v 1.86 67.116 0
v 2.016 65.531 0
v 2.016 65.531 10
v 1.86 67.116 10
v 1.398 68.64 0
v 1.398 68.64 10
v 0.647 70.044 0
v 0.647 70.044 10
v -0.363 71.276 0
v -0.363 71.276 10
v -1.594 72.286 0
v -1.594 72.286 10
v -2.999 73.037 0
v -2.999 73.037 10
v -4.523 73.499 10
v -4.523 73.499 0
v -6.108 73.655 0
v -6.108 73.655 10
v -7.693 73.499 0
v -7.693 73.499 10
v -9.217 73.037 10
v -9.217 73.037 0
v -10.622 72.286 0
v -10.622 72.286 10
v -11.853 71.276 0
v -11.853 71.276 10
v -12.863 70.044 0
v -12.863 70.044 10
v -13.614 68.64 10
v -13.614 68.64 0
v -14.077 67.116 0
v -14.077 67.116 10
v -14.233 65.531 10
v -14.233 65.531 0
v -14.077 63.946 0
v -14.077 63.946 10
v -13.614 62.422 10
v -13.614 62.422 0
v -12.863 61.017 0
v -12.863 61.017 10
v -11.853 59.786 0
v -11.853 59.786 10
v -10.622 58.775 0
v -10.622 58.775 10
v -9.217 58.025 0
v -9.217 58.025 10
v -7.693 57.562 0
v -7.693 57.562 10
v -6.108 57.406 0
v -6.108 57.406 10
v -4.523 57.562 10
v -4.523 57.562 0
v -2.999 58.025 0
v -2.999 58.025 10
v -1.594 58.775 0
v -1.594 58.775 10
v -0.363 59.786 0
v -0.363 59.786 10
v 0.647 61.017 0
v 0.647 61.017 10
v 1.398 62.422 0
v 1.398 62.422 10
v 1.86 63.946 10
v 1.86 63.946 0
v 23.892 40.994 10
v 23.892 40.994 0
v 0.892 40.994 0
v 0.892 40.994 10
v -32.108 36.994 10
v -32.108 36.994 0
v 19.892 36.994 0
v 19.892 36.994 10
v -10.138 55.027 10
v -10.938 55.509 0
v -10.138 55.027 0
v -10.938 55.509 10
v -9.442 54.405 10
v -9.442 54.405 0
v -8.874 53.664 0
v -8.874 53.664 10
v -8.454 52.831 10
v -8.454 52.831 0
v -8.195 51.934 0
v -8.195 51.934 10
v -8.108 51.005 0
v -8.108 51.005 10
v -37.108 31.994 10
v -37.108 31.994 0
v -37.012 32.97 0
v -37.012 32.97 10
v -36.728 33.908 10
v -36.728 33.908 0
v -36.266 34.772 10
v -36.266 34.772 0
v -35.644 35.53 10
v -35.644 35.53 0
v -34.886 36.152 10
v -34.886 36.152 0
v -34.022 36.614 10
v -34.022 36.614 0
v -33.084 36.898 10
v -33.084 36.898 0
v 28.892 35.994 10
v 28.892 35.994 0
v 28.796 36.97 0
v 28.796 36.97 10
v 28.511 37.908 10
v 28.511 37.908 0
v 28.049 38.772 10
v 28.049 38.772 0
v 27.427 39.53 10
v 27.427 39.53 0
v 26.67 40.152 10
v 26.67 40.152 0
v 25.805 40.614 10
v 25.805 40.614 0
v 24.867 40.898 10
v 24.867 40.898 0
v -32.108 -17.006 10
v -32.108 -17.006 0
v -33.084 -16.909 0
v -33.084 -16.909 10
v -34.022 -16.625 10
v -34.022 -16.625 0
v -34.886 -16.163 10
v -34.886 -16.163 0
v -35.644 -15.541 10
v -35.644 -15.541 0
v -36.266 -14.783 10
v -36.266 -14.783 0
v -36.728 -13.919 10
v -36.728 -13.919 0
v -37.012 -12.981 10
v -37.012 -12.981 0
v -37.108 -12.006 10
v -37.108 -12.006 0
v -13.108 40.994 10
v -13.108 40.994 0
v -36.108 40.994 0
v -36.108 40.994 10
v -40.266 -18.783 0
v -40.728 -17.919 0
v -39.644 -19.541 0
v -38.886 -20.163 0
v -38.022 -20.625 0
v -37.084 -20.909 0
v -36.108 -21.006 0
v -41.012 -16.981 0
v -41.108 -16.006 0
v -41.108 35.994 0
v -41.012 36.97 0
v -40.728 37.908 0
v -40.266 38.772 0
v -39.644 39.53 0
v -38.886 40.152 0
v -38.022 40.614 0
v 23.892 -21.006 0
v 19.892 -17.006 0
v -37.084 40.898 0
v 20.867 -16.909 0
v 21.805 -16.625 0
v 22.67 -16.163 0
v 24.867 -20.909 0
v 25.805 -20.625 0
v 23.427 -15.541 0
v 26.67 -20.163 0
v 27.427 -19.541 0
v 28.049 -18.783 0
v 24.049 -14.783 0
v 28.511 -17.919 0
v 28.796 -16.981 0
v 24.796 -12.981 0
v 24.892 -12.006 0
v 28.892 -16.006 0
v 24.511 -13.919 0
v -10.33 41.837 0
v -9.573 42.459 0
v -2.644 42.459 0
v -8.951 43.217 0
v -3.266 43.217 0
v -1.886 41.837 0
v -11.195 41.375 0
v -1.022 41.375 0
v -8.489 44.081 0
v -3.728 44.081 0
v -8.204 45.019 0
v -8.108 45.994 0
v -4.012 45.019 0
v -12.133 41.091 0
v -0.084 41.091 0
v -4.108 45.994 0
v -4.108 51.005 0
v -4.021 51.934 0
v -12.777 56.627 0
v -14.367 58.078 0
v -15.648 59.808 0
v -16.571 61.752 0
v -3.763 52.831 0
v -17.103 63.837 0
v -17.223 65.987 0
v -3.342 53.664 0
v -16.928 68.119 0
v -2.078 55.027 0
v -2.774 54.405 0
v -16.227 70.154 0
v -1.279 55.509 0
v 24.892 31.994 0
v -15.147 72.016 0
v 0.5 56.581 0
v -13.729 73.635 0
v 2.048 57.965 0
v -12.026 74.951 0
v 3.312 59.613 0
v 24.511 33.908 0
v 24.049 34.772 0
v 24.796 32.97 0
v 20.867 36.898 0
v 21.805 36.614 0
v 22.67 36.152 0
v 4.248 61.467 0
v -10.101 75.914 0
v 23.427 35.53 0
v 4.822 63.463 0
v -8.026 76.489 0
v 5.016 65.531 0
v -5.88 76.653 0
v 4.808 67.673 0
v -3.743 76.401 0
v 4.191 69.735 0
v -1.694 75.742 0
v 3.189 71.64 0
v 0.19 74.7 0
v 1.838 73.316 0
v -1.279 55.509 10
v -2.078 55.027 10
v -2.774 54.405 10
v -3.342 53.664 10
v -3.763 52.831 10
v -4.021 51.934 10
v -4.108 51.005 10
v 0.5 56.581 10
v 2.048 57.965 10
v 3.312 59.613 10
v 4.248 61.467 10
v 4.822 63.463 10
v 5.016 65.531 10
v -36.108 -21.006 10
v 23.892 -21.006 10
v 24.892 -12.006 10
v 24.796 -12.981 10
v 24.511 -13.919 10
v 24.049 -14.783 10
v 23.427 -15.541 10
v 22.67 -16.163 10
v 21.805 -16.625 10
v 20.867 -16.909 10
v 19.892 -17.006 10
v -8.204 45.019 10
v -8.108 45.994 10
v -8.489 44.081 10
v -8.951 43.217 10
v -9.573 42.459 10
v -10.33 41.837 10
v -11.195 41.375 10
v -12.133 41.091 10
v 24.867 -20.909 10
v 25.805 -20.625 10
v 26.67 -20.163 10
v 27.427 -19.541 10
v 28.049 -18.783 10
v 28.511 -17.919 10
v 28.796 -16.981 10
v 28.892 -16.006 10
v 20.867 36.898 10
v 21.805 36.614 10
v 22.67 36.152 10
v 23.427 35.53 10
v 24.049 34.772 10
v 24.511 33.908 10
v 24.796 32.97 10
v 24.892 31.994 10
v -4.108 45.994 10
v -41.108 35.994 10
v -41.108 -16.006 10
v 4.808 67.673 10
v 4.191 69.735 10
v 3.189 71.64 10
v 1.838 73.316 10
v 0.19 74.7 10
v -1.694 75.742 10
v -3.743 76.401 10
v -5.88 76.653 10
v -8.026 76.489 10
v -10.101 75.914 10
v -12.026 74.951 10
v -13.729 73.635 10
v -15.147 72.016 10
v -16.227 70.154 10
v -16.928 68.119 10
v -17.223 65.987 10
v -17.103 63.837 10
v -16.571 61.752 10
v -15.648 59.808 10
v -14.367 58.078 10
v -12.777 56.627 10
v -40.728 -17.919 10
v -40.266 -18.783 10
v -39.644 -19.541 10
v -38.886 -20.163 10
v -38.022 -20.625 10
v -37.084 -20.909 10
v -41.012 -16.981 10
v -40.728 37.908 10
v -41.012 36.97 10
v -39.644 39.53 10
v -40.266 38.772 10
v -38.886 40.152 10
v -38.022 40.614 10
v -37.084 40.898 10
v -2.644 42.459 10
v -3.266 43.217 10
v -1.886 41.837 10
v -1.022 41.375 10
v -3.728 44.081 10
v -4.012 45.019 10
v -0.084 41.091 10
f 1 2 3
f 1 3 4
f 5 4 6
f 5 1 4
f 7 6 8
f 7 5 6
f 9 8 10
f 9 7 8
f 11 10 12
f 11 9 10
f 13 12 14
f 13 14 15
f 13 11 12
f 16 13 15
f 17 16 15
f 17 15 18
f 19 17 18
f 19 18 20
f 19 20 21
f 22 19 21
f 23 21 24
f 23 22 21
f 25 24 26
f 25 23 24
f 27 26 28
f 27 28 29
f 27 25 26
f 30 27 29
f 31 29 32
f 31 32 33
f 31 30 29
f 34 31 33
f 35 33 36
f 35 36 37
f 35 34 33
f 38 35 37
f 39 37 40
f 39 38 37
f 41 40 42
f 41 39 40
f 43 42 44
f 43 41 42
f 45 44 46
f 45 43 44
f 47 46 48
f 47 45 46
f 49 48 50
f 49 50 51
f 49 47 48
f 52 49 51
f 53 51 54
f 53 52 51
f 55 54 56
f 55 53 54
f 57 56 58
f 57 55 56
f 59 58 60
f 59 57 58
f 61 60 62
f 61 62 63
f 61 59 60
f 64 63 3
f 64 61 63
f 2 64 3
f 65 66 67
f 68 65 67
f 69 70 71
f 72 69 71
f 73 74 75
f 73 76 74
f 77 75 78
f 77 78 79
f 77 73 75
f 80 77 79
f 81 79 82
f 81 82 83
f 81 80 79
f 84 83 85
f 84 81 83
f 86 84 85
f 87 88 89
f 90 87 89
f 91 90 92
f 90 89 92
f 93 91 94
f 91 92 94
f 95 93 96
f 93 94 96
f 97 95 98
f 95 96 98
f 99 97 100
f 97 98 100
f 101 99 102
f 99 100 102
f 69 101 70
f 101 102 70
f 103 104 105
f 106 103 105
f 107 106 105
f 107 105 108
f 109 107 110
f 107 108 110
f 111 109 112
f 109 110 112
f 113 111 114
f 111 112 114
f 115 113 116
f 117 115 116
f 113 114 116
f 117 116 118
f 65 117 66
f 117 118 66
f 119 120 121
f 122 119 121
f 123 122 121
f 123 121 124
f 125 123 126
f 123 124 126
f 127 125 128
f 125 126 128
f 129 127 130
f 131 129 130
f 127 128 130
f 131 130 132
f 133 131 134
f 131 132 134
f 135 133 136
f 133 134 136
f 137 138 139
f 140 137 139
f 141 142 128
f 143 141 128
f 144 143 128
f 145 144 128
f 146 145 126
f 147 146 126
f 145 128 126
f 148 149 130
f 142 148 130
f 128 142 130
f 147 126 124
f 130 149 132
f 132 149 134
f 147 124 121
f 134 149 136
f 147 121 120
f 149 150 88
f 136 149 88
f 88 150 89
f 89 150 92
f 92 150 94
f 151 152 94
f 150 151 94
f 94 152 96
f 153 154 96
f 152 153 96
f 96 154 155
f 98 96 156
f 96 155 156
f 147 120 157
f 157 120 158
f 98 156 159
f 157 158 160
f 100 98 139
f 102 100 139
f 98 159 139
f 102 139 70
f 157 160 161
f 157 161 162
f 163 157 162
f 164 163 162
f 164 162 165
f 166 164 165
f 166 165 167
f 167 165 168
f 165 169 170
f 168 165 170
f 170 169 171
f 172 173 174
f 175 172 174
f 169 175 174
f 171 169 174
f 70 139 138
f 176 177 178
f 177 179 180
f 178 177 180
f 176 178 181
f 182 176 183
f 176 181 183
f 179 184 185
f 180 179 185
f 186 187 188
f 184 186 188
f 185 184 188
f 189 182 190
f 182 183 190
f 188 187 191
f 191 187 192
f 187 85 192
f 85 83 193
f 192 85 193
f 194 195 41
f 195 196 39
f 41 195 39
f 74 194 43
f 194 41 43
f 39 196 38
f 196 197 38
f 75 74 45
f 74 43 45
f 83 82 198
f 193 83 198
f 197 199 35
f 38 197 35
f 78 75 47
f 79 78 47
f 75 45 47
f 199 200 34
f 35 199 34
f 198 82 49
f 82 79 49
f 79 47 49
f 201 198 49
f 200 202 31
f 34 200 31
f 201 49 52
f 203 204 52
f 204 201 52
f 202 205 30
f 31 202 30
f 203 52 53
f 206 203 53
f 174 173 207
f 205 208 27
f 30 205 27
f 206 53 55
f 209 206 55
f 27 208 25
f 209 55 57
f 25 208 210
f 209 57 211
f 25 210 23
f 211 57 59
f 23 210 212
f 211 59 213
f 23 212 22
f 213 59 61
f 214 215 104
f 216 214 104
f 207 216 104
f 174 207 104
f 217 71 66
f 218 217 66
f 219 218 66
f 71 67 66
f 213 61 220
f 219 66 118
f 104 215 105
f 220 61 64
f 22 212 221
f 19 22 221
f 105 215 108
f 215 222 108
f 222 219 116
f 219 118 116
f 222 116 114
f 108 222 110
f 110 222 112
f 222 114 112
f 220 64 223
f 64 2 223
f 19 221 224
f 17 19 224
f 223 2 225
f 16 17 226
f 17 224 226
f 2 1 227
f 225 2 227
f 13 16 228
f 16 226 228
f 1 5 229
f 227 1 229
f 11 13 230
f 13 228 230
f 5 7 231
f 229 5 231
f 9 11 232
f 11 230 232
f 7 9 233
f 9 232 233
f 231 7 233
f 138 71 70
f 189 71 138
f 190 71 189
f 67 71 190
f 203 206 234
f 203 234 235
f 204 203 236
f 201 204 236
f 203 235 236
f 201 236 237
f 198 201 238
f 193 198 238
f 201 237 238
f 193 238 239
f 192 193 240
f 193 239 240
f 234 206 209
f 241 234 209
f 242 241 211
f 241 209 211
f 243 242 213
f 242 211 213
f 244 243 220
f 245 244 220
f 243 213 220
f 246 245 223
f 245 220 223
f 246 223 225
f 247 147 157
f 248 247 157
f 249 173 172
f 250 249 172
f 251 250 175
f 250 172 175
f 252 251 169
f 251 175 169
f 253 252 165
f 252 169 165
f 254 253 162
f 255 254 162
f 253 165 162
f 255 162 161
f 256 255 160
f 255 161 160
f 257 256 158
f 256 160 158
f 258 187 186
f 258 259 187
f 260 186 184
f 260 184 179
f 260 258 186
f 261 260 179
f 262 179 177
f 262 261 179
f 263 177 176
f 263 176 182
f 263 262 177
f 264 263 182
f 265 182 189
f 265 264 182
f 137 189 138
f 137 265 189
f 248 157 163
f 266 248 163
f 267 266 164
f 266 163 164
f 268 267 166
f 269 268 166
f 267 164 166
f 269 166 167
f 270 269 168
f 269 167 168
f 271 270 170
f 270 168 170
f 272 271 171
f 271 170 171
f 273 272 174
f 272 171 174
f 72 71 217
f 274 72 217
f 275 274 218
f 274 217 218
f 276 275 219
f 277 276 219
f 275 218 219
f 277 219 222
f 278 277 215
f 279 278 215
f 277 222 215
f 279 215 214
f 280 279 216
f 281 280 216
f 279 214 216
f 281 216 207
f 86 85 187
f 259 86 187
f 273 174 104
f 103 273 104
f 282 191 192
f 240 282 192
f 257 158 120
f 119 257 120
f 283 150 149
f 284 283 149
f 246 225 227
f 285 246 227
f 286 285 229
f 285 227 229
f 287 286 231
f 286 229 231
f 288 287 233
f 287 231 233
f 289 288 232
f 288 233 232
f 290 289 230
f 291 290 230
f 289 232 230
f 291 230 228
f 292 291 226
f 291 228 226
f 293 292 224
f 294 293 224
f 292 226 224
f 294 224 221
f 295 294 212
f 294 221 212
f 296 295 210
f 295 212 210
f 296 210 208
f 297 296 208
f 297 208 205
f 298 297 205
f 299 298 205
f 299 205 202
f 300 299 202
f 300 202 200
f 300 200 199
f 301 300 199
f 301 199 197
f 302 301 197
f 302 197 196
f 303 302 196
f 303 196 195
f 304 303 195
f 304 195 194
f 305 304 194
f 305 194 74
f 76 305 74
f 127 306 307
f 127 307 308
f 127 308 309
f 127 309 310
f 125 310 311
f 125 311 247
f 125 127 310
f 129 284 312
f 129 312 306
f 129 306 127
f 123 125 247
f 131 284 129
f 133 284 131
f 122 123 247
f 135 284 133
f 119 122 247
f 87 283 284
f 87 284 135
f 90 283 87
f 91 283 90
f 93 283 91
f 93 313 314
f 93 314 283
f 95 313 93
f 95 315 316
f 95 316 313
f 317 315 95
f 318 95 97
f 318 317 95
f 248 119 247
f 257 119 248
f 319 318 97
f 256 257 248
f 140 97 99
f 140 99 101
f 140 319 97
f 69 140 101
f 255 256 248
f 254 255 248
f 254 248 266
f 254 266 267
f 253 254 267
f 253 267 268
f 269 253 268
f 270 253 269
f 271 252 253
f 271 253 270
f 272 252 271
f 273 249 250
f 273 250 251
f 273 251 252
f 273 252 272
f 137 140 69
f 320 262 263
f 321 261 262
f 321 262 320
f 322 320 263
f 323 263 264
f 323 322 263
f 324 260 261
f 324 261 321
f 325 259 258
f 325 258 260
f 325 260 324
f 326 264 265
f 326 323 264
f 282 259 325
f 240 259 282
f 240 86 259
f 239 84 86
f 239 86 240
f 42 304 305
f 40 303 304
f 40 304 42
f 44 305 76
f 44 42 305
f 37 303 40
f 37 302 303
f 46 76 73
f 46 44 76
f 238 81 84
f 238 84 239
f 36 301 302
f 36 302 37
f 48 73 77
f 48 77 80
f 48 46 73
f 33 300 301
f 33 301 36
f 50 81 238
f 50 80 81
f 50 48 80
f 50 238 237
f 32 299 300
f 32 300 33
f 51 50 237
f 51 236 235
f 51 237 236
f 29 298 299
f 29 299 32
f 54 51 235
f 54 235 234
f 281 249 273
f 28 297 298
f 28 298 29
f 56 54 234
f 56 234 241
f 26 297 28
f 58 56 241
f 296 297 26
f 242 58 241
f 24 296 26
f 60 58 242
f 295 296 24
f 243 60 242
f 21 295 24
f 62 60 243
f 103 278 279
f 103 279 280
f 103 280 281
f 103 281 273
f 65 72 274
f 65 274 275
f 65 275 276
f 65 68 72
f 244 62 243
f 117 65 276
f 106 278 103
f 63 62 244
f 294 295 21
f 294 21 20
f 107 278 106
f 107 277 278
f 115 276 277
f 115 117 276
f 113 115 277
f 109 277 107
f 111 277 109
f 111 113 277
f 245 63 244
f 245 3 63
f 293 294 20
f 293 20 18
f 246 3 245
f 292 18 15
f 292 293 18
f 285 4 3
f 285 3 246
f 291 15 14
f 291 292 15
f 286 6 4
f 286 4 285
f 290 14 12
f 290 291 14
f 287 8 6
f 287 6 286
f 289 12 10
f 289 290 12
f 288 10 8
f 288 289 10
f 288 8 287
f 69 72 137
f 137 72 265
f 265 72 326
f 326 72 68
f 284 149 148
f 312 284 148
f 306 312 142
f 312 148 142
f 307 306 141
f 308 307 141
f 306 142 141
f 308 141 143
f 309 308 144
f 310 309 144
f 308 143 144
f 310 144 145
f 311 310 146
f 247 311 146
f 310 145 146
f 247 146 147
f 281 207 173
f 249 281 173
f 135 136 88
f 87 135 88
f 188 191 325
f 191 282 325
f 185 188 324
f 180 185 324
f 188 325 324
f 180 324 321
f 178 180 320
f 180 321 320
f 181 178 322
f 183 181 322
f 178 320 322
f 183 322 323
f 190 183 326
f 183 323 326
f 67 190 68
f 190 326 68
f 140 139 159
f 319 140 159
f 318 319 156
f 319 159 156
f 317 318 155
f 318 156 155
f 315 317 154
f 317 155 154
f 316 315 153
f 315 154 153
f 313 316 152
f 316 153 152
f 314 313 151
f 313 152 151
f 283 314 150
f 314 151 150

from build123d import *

# Parameters (mm, degrees)
F0_R     = 8.1245
F1_DEPTH = 10
F2_R     = 5


with BuildPart() as f1:
    # F0 (on Top) → F1 (new body)
    with BuildSketch(Plane.XY):
        with BuildLine():
            ThreePointArc((5.016295, 65.530641), (-13.232302, 74.074747), (-8.108205, 54.587401))
            ThreePointArc((-8.108205, 54.587401), (-6.108205, 54.406141), (-4.108205, 54.587401))
            ThreePointArc((-4.108205, 54.587401), (2.435901, 58.406544), (5.016295, 65.530641))
        make_face()
        with Locations((-6.108205, 65.530641)):
            Circle(F0_R, mode=Mode.SUBTRACT)
        with BuildLine():
            Line((-8.108205, 40.99443), (-36.108205, 40.99443))
            ThreePointArc((-36.108205, 40.99443), (-39.643739, 39.529964), (-41.108205, 35.99443))
            Line((-41.108205, 35.99443), (-41.108205, -16.00557))
            ThreePointArc((-41.108205, -16.00557), (-39.643739, -19.541104), (-36.108205, -21.00557))
            Line((-36.108205, -21.00557), (23.891795, -21.00557))
            ThreePointArc((23.891795, -21.00557), (27.427329, -19.541104), (28.891795, -16.00557))
            Line((28.891795, -16.00557), (28.891795, 35.99443))
            ThreePointArc((28.891795, 35.99443), (27.427329, 39.529964), (23.891795, 40.99443))
            Line((23.891795, 40.99443), (-4.108205, 40.99443))
            Line((-4.108205, 40.99443), (-4.108205, 54.587401))
            ThreePointArc((-4.108205, 54.587401), (-6.108205, 54.406141), (-8.108205, 54.587401))
            Line((-8.108205, 54.587401), (-8.108205, 40.99443))
        make_face()
        with BuildLine():
            ThreePointArc((-37.108205, 31.99443), (-35.643739, 35.529964), (-32.108205, 36.99443))
            Line((-32.108205, 36.99443), (19.891795, 36.99443))
            ThreePointArc((19.891795, 36.99443), (23.427329, 35.529964), (24.891795, 31.99443))
            Line((24.891795, 31.99443), (24.891795, -12.00557))
            ThreePointArc((24.891795, -12.00557), (23.427329, -15.541104), (19.891795, -17.00557))
            Line((19.891795, -17.00557), (-32.108205, -17.00557))
            ThreePointArc((-32.108205, -17.00557), (-35.643739, -15.541104), (-37.108205, -12.00557))
            Line((-37.108205, -12.00557), (-37.108205, 31.99443))
        make_face(mode=Mode.SUBTRACT)
    extrude(amount=F1_DEPTH)

    # F2
    f2_edges = [f1.edges().sort_by_distance(p)[0] for p in [
        (-4.108205, 54.587401, 5),
        (-8.108205, 54.587401, 5),
        (-8.108205, 40.99443, 5),
        (-4.108205, 40.99443, 5),
    ]]
    fillet(f2_edges, radius=F2_R)


solid = f1.part
